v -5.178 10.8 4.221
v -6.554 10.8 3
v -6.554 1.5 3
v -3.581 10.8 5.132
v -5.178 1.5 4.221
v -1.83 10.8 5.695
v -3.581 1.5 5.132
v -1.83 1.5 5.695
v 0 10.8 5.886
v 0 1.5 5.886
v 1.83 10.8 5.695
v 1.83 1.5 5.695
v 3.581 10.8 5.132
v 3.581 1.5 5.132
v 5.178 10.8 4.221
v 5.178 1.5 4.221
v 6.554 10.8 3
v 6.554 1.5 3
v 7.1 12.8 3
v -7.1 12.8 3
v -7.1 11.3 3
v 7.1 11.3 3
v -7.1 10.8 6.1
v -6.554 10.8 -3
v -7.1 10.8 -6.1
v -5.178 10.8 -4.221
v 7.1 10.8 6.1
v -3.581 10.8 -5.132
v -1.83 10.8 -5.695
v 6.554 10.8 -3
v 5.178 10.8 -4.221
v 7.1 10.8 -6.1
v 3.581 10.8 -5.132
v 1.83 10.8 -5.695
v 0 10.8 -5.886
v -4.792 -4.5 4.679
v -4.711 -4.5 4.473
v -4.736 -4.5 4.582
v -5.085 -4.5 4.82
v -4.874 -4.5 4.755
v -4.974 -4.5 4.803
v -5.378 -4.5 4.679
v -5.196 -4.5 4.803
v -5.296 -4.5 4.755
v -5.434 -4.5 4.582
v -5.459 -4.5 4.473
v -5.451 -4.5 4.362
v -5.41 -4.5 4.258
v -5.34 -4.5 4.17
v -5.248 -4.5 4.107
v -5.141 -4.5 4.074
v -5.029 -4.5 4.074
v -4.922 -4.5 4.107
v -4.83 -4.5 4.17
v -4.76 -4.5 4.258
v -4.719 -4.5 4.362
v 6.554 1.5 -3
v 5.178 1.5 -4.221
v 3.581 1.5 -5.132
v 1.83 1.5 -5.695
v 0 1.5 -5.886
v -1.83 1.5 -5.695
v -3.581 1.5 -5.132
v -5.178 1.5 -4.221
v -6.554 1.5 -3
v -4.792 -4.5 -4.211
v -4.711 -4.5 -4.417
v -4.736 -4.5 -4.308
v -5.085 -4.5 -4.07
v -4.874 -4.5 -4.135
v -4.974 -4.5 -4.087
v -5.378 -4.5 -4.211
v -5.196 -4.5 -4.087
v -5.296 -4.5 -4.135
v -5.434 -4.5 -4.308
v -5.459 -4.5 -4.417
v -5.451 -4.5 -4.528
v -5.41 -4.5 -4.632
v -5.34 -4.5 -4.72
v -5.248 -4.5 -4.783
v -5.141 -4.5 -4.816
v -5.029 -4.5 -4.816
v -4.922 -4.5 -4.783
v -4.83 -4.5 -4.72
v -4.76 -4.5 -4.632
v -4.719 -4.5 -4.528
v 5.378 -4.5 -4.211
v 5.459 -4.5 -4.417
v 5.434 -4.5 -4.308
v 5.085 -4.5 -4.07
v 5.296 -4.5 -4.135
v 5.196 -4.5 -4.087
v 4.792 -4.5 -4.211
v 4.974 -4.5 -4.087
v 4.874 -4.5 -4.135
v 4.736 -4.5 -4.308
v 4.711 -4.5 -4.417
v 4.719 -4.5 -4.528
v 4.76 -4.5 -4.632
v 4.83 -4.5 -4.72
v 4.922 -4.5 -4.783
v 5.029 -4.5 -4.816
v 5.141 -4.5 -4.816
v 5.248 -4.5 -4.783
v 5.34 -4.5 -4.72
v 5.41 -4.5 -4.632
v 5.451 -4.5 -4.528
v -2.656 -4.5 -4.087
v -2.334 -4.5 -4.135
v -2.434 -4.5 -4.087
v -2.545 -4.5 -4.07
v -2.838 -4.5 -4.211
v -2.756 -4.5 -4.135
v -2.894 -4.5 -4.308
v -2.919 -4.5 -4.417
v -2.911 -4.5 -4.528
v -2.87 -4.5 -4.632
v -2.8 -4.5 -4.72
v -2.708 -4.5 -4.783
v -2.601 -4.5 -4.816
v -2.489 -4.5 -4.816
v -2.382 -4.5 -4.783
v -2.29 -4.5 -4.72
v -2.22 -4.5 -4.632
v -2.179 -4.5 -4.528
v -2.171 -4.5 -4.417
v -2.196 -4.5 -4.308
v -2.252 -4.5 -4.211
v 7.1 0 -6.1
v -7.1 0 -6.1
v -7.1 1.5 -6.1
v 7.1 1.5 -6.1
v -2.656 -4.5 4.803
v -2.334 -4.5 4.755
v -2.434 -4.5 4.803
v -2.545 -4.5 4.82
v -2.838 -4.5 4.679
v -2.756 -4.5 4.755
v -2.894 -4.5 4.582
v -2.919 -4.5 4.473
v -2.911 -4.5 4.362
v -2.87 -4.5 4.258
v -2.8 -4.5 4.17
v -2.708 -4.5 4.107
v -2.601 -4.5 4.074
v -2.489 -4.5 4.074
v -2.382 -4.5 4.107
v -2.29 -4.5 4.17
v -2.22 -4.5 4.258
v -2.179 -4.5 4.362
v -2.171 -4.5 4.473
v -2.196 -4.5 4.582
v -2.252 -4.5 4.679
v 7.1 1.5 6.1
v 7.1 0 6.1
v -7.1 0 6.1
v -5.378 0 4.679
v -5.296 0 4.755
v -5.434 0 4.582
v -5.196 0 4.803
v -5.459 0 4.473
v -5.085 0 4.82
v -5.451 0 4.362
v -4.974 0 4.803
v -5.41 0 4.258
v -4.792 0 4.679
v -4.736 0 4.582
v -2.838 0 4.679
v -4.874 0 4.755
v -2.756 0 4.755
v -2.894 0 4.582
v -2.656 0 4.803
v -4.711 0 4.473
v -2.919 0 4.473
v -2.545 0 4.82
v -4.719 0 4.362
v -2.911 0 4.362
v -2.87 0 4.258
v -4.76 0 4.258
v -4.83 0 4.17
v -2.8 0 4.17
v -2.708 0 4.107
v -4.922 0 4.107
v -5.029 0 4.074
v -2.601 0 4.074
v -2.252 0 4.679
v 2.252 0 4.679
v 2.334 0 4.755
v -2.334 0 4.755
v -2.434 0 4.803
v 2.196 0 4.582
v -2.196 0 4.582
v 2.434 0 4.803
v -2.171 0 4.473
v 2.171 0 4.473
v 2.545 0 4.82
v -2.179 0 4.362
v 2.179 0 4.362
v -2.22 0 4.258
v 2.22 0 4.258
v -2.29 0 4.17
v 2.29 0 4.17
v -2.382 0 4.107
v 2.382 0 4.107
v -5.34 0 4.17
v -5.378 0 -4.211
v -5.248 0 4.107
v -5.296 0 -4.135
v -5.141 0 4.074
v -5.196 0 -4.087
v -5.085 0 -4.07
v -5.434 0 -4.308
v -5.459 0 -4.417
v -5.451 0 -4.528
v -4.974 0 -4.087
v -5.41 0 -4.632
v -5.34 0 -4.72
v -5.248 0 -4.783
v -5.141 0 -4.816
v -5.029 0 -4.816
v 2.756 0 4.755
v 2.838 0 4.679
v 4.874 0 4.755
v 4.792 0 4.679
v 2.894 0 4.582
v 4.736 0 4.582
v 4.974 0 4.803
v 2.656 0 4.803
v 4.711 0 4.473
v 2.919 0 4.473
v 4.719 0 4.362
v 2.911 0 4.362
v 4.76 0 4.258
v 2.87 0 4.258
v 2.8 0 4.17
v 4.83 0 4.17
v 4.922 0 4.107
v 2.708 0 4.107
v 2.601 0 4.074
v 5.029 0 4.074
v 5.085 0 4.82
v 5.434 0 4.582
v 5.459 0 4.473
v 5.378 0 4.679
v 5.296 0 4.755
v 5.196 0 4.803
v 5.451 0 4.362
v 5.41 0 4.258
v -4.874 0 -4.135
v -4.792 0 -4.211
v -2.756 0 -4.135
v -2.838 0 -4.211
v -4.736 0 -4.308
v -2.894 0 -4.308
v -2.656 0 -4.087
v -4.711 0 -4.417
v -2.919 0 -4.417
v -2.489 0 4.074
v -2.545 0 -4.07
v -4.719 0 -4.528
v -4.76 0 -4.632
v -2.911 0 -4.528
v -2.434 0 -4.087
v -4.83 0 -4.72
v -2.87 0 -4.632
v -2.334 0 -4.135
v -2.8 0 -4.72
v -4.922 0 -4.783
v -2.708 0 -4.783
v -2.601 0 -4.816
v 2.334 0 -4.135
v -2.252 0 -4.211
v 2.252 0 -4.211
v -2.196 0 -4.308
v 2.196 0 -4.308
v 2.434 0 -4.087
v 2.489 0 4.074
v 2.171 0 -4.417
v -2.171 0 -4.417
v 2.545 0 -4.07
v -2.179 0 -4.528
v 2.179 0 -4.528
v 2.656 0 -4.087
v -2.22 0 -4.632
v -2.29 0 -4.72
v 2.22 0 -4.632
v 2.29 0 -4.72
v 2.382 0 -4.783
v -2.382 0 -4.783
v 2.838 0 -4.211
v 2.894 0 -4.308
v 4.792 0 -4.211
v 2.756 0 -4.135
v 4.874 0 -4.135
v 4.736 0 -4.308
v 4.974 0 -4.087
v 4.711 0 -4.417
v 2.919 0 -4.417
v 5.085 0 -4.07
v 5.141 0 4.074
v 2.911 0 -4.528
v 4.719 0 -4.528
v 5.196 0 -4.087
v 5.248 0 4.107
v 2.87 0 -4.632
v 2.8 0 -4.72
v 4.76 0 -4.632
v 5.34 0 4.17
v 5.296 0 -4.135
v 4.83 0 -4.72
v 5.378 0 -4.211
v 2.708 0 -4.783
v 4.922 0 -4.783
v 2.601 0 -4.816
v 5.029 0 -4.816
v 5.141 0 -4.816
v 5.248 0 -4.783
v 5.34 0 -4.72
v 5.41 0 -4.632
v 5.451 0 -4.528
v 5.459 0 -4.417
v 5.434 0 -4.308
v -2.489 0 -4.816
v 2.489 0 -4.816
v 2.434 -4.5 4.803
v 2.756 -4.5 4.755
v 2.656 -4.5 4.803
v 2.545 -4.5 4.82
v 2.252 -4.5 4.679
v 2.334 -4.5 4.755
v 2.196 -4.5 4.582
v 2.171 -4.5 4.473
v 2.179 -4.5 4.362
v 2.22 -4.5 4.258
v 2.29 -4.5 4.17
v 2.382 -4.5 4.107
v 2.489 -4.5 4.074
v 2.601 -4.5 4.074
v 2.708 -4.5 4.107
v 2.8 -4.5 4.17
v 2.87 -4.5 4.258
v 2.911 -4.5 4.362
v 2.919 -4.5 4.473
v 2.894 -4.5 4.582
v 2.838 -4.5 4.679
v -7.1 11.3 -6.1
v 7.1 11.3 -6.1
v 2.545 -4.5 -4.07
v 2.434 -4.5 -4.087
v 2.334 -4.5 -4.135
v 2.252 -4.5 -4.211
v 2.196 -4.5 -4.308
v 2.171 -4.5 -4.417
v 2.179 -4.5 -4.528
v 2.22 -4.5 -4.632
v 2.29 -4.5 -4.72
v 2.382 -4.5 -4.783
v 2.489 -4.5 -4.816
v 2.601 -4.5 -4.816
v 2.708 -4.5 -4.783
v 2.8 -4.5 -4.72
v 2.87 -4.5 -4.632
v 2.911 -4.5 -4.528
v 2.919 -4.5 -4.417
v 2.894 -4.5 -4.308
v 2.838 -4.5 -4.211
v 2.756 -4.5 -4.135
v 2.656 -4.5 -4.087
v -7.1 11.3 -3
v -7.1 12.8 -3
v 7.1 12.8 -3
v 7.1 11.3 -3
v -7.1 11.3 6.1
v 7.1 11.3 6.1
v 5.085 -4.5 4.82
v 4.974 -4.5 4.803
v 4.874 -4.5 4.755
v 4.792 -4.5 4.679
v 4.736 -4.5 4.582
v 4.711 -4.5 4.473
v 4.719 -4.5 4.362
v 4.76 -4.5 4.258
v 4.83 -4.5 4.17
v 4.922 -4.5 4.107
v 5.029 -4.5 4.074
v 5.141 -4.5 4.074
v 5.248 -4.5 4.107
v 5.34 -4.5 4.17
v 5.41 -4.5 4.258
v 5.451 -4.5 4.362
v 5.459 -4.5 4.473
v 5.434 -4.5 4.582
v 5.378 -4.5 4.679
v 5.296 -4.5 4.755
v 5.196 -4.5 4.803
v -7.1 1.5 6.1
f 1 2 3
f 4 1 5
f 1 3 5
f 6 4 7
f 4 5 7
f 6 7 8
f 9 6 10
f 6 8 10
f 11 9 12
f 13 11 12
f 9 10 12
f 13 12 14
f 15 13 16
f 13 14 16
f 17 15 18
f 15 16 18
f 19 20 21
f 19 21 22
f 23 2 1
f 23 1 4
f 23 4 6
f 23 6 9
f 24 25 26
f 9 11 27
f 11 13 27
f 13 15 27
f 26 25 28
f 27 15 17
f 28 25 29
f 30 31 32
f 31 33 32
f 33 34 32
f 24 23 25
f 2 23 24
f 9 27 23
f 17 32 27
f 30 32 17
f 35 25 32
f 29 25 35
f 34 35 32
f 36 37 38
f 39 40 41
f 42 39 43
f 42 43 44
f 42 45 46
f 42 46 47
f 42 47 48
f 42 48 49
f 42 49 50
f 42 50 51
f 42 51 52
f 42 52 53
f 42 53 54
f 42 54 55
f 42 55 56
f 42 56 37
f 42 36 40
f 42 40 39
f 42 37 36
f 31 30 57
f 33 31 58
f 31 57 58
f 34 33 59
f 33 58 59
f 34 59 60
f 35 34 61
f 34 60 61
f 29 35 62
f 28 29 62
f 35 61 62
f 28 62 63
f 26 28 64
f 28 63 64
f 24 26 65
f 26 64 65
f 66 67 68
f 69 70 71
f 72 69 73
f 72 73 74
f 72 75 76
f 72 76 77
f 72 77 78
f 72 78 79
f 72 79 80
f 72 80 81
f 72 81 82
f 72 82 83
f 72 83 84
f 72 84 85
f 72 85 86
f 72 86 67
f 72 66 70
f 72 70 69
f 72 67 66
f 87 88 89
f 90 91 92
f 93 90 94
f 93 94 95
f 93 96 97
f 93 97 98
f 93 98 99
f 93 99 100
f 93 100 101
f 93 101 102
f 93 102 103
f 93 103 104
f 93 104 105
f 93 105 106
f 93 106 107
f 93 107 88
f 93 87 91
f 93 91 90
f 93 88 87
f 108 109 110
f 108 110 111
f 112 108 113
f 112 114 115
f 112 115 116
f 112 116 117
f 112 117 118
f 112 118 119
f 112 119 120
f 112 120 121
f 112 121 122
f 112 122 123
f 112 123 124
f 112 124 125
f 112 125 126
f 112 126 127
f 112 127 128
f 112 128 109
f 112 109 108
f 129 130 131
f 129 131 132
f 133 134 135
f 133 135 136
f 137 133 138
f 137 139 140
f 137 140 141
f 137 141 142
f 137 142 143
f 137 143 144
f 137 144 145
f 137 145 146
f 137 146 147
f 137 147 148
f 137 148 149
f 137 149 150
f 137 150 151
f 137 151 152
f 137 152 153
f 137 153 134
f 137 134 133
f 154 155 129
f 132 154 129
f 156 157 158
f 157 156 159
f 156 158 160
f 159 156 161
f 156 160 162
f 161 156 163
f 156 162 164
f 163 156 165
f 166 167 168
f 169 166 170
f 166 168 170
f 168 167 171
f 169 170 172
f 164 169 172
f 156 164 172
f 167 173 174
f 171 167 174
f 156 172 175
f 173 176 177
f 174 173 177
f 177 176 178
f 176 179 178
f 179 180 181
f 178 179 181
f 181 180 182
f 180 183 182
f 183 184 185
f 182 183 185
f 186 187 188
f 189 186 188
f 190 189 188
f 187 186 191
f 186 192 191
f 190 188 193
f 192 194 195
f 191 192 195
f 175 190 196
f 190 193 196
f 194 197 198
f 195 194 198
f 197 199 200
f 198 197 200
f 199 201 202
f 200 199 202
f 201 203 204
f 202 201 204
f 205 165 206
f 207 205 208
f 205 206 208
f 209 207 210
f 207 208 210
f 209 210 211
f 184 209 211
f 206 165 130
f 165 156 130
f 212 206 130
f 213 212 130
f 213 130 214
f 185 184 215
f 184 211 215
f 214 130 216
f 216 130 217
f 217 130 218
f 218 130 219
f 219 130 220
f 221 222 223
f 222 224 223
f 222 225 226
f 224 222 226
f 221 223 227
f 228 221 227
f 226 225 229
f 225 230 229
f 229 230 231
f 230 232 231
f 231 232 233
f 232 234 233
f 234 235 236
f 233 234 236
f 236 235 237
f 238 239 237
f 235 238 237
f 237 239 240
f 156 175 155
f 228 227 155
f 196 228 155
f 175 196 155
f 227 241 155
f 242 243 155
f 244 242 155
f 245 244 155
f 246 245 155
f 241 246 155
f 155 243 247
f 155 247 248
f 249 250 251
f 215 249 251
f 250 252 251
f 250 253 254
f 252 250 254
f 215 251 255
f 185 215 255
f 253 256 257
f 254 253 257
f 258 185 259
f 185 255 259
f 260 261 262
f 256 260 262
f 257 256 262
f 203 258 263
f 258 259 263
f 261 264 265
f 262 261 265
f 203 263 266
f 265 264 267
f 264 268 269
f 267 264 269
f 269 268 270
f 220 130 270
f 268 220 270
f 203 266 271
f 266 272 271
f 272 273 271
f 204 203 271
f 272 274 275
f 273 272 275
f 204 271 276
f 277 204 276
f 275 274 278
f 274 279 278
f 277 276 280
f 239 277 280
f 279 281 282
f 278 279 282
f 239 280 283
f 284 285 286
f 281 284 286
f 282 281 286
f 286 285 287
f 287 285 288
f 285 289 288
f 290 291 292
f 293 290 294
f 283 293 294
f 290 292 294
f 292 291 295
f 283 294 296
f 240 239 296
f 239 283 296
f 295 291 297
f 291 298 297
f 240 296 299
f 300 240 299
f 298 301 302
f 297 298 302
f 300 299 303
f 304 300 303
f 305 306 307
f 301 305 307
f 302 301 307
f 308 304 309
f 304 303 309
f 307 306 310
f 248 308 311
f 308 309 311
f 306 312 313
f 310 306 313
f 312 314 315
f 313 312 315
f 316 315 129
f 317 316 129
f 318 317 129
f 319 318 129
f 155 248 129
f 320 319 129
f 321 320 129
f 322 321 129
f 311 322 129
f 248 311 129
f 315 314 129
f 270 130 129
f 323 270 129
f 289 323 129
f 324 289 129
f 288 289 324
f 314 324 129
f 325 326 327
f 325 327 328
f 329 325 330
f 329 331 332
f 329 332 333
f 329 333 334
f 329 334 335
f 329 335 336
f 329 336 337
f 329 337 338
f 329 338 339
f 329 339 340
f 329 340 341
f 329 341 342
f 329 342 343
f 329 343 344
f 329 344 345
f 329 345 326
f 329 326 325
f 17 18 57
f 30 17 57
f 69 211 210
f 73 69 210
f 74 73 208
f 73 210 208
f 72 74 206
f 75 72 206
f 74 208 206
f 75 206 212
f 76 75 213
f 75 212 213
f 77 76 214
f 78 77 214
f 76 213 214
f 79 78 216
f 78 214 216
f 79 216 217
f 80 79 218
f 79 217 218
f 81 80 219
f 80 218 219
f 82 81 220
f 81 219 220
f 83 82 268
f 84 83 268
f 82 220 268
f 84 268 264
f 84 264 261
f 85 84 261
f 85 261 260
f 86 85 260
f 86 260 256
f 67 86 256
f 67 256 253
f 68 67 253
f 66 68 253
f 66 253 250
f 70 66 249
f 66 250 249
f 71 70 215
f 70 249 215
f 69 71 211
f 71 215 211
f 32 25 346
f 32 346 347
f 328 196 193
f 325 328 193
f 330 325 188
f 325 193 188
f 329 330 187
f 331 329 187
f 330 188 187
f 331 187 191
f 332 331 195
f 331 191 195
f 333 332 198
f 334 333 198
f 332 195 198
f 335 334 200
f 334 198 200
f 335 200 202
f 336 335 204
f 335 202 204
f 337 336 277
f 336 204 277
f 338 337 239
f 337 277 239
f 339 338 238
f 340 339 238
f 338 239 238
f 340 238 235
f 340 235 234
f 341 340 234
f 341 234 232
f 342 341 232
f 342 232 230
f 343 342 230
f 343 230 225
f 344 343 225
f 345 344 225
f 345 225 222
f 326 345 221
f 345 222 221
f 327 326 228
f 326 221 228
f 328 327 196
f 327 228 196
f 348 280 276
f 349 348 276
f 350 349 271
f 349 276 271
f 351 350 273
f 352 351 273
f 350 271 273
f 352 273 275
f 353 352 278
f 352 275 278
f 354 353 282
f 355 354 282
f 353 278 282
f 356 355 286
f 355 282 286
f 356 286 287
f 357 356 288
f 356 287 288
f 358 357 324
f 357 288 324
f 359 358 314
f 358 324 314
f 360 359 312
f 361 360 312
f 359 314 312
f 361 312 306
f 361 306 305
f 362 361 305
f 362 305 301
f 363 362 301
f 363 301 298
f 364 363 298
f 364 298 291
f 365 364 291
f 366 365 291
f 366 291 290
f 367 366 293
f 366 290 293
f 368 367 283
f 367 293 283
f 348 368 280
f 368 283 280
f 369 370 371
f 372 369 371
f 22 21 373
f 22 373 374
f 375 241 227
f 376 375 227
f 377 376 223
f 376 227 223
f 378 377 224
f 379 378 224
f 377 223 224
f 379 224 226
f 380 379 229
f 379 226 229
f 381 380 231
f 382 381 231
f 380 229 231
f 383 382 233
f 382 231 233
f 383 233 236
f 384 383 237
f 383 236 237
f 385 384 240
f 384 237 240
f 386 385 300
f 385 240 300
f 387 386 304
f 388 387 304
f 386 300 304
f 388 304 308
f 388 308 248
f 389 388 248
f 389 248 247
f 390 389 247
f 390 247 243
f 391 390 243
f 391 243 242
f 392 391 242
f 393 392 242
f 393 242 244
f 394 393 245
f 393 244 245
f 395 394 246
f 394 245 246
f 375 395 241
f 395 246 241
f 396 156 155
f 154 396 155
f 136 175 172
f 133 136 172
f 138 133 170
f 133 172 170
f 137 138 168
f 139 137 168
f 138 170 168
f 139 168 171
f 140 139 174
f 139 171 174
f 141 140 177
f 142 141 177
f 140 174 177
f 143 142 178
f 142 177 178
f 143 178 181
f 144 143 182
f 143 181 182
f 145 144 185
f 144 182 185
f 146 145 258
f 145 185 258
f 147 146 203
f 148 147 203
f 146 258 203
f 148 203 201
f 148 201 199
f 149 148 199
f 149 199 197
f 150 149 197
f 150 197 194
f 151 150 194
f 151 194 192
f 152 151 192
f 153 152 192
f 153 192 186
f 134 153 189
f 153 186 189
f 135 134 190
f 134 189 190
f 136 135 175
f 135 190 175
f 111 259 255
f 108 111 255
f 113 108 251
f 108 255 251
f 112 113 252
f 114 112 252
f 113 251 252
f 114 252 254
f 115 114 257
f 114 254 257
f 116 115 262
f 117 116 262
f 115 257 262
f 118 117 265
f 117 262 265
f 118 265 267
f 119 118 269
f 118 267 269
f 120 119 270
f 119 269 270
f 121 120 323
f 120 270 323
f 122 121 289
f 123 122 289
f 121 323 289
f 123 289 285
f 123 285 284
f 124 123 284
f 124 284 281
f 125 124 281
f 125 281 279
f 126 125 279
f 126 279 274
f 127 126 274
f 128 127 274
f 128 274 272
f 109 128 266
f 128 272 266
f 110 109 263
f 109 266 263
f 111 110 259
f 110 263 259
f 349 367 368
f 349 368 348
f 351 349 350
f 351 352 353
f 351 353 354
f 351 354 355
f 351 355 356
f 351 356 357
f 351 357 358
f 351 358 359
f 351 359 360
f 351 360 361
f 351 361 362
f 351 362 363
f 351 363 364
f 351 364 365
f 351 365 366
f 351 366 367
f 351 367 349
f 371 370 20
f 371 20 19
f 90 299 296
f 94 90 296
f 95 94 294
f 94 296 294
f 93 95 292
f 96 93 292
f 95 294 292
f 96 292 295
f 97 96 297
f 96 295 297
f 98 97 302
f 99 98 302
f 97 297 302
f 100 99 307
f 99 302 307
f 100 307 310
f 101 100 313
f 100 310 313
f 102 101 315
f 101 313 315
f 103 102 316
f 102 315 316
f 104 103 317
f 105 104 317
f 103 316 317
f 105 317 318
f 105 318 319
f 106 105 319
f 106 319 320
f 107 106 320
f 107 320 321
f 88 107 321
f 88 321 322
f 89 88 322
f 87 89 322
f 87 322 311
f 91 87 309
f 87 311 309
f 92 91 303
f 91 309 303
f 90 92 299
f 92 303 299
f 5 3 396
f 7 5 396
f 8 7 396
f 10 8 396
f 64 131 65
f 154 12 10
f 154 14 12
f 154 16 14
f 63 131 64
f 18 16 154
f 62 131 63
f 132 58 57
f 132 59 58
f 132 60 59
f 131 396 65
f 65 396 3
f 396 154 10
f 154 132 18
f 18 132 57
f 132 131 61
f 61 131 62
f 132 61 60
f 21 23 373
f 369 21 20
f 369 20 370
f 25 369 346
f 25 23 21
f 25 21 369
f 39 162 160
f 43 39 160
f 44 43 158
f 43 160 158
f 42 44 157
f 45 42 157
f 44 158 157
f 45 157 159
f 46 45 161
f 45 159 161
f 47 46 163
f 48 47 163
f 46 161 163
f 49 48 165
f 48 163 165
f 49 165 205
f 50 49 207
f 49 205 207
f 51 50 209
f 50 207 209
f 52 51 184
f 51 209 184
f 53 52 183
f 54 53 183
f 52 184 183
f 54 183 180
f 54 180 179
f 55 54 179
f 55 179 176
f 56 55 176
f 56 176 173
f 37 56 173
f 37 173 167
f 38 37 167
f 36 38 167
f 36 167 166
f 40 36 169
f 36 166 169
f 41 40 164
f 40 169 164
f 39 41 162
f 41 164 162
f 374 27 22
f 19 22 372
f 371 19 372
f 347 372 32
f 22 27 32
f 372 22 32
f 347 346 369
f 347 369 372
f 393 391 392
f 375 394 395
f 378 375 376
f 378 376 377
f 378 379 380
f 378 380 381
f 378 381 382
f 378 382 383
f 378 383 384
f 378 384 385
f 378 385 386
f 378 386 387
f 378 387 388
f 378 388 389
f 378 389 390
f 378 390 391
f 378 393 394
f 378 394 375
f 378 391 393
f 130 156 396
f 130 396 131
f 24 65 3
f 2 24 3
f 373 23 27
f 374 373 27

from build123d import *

# Parameters (mm, degrees)
SKETCH_1_W           = 14.2
SKETCH_1_H           = 12.2
EXTRUDE_1_DEPTH      = 12.8
SKETCH_2_OUTSIDE_W   = 20.736
SKETCH_2_OUTSIDE_H   = 18.736
SKETCH_2_OUTSIDE_W_2 = 19.736348523
SKETCH_2_OUTSIDE_H_2 = 6
CUT_EXTRUDE_1_DEPTH  = 1.5
SKETCH_3_OUTSIDE_W   = 20.736
SKETCH_3_OUTSIDE_H   = 18.736
CUT_EXTRUDE_2_DEPTH  = 9.3
SKETCH_4_R           = 0.375
EXTRUDE_2_DEPTH      = 4.5


with BuildPart() as part:
    # 草图1 → 凸台-拉伸1 (new body)
    with BuildSketch(Plane(origin=(0, 0, 0), x_dir=(1, 0, 0), z_dir=(0, 1, 0))):
        Rectangle(SKETCH_1_W, SKETCH_1_H)
    extrude(amount=EXTRUDE_1_DEPTH)

    # 草图2 outside → 切除-拉伸1 (cut)
    with BuildSketch(Plane(origin=(0, 12.8, 0), x_dir=(1, 0, 0), z_dir=(0, 1, 0))):
        Rectangle(SKETCH_2_OUTSIDE_W, SKETCH_2_OUTSIDE_H)
        with Locations((-0.320715663, 0)):
            Rectangle(SKETCH_2_OUTSIDE_W_2, SKETCH_2_OUTSIDE_H_2, mode=Mode.SUBTRACT)
    extrude(amount=-CUT_EXTRUDE_1_DEPTH, mode=Mode.SUBTRACT)

    # 草图3 outside → 切除-拉伸2 (cut)
    with BuildSketch(Plane(origin=(0, 1.5, 0), x_dir=(1, 0, 0), z_dir=(0, 1, 0))):
        Rectangle(SKETCH_3_OUTSIDE_W, SKETCH_3_OUTSIDE_H)
        with BuildLine():
            Line((-6.554198564, 3), (-6.554198564, -3))
            ThreePointArc((-6.554198564, -3), (0, -5.885804343), (6.554198564, -3))
            Line((6.554198564, -3), (6.554198564, 3))
            ThreePointArc((6.554198564, 3), (0, 5.885804343), (-6.554198564, 3))
        make_face(mode=Mode.SUBTRACT)
    extrude(amount=CUT_EXTRUDE_2_DEPTH, mode=Mode.SUBTRACT)

    # 草图4 → 凸台-拉伸2 (add)
    with BuildSketch(Plane.XZ):
        with Locations(Location((-5.085, 4.445, 0), (0, 0, 90))):
            Circle(SKETCH_4_R)
        with Locations(Location((-2.545, 4.445, 0), (0, 0, 90))):
            Circle(SKETCH_4_R)
        with Locations(Location((2.545, 4.445, 0), (0, 0, 90))):
            Circle(SKETCH_4_R)
        with Locations(Location((5.085, 4.445, 0), (0, 0, 90))):
            Circle(SKETCH_4_R)
        with Locations(Location((5.085, -4.445, 0), (0, 0, 90))):
            Circle(SKETCH_4_R)
        with Locations(Location((2.545, -4.445, 0), (0, 0, 90))):
            Circle(SKETCH_4_R)
        with Locations(Location((-2.545, -4.445, 0), (0, 0, 90))):
            Circle(SKETCH_4_R)
        with Locations(Location((-5.085, -4.445, 0), (0, 0, 90))):
            Circle(SKETCH_4_R)
    extrude(amount=EXTRUDE_2_DEPTH)


solid = part.part
